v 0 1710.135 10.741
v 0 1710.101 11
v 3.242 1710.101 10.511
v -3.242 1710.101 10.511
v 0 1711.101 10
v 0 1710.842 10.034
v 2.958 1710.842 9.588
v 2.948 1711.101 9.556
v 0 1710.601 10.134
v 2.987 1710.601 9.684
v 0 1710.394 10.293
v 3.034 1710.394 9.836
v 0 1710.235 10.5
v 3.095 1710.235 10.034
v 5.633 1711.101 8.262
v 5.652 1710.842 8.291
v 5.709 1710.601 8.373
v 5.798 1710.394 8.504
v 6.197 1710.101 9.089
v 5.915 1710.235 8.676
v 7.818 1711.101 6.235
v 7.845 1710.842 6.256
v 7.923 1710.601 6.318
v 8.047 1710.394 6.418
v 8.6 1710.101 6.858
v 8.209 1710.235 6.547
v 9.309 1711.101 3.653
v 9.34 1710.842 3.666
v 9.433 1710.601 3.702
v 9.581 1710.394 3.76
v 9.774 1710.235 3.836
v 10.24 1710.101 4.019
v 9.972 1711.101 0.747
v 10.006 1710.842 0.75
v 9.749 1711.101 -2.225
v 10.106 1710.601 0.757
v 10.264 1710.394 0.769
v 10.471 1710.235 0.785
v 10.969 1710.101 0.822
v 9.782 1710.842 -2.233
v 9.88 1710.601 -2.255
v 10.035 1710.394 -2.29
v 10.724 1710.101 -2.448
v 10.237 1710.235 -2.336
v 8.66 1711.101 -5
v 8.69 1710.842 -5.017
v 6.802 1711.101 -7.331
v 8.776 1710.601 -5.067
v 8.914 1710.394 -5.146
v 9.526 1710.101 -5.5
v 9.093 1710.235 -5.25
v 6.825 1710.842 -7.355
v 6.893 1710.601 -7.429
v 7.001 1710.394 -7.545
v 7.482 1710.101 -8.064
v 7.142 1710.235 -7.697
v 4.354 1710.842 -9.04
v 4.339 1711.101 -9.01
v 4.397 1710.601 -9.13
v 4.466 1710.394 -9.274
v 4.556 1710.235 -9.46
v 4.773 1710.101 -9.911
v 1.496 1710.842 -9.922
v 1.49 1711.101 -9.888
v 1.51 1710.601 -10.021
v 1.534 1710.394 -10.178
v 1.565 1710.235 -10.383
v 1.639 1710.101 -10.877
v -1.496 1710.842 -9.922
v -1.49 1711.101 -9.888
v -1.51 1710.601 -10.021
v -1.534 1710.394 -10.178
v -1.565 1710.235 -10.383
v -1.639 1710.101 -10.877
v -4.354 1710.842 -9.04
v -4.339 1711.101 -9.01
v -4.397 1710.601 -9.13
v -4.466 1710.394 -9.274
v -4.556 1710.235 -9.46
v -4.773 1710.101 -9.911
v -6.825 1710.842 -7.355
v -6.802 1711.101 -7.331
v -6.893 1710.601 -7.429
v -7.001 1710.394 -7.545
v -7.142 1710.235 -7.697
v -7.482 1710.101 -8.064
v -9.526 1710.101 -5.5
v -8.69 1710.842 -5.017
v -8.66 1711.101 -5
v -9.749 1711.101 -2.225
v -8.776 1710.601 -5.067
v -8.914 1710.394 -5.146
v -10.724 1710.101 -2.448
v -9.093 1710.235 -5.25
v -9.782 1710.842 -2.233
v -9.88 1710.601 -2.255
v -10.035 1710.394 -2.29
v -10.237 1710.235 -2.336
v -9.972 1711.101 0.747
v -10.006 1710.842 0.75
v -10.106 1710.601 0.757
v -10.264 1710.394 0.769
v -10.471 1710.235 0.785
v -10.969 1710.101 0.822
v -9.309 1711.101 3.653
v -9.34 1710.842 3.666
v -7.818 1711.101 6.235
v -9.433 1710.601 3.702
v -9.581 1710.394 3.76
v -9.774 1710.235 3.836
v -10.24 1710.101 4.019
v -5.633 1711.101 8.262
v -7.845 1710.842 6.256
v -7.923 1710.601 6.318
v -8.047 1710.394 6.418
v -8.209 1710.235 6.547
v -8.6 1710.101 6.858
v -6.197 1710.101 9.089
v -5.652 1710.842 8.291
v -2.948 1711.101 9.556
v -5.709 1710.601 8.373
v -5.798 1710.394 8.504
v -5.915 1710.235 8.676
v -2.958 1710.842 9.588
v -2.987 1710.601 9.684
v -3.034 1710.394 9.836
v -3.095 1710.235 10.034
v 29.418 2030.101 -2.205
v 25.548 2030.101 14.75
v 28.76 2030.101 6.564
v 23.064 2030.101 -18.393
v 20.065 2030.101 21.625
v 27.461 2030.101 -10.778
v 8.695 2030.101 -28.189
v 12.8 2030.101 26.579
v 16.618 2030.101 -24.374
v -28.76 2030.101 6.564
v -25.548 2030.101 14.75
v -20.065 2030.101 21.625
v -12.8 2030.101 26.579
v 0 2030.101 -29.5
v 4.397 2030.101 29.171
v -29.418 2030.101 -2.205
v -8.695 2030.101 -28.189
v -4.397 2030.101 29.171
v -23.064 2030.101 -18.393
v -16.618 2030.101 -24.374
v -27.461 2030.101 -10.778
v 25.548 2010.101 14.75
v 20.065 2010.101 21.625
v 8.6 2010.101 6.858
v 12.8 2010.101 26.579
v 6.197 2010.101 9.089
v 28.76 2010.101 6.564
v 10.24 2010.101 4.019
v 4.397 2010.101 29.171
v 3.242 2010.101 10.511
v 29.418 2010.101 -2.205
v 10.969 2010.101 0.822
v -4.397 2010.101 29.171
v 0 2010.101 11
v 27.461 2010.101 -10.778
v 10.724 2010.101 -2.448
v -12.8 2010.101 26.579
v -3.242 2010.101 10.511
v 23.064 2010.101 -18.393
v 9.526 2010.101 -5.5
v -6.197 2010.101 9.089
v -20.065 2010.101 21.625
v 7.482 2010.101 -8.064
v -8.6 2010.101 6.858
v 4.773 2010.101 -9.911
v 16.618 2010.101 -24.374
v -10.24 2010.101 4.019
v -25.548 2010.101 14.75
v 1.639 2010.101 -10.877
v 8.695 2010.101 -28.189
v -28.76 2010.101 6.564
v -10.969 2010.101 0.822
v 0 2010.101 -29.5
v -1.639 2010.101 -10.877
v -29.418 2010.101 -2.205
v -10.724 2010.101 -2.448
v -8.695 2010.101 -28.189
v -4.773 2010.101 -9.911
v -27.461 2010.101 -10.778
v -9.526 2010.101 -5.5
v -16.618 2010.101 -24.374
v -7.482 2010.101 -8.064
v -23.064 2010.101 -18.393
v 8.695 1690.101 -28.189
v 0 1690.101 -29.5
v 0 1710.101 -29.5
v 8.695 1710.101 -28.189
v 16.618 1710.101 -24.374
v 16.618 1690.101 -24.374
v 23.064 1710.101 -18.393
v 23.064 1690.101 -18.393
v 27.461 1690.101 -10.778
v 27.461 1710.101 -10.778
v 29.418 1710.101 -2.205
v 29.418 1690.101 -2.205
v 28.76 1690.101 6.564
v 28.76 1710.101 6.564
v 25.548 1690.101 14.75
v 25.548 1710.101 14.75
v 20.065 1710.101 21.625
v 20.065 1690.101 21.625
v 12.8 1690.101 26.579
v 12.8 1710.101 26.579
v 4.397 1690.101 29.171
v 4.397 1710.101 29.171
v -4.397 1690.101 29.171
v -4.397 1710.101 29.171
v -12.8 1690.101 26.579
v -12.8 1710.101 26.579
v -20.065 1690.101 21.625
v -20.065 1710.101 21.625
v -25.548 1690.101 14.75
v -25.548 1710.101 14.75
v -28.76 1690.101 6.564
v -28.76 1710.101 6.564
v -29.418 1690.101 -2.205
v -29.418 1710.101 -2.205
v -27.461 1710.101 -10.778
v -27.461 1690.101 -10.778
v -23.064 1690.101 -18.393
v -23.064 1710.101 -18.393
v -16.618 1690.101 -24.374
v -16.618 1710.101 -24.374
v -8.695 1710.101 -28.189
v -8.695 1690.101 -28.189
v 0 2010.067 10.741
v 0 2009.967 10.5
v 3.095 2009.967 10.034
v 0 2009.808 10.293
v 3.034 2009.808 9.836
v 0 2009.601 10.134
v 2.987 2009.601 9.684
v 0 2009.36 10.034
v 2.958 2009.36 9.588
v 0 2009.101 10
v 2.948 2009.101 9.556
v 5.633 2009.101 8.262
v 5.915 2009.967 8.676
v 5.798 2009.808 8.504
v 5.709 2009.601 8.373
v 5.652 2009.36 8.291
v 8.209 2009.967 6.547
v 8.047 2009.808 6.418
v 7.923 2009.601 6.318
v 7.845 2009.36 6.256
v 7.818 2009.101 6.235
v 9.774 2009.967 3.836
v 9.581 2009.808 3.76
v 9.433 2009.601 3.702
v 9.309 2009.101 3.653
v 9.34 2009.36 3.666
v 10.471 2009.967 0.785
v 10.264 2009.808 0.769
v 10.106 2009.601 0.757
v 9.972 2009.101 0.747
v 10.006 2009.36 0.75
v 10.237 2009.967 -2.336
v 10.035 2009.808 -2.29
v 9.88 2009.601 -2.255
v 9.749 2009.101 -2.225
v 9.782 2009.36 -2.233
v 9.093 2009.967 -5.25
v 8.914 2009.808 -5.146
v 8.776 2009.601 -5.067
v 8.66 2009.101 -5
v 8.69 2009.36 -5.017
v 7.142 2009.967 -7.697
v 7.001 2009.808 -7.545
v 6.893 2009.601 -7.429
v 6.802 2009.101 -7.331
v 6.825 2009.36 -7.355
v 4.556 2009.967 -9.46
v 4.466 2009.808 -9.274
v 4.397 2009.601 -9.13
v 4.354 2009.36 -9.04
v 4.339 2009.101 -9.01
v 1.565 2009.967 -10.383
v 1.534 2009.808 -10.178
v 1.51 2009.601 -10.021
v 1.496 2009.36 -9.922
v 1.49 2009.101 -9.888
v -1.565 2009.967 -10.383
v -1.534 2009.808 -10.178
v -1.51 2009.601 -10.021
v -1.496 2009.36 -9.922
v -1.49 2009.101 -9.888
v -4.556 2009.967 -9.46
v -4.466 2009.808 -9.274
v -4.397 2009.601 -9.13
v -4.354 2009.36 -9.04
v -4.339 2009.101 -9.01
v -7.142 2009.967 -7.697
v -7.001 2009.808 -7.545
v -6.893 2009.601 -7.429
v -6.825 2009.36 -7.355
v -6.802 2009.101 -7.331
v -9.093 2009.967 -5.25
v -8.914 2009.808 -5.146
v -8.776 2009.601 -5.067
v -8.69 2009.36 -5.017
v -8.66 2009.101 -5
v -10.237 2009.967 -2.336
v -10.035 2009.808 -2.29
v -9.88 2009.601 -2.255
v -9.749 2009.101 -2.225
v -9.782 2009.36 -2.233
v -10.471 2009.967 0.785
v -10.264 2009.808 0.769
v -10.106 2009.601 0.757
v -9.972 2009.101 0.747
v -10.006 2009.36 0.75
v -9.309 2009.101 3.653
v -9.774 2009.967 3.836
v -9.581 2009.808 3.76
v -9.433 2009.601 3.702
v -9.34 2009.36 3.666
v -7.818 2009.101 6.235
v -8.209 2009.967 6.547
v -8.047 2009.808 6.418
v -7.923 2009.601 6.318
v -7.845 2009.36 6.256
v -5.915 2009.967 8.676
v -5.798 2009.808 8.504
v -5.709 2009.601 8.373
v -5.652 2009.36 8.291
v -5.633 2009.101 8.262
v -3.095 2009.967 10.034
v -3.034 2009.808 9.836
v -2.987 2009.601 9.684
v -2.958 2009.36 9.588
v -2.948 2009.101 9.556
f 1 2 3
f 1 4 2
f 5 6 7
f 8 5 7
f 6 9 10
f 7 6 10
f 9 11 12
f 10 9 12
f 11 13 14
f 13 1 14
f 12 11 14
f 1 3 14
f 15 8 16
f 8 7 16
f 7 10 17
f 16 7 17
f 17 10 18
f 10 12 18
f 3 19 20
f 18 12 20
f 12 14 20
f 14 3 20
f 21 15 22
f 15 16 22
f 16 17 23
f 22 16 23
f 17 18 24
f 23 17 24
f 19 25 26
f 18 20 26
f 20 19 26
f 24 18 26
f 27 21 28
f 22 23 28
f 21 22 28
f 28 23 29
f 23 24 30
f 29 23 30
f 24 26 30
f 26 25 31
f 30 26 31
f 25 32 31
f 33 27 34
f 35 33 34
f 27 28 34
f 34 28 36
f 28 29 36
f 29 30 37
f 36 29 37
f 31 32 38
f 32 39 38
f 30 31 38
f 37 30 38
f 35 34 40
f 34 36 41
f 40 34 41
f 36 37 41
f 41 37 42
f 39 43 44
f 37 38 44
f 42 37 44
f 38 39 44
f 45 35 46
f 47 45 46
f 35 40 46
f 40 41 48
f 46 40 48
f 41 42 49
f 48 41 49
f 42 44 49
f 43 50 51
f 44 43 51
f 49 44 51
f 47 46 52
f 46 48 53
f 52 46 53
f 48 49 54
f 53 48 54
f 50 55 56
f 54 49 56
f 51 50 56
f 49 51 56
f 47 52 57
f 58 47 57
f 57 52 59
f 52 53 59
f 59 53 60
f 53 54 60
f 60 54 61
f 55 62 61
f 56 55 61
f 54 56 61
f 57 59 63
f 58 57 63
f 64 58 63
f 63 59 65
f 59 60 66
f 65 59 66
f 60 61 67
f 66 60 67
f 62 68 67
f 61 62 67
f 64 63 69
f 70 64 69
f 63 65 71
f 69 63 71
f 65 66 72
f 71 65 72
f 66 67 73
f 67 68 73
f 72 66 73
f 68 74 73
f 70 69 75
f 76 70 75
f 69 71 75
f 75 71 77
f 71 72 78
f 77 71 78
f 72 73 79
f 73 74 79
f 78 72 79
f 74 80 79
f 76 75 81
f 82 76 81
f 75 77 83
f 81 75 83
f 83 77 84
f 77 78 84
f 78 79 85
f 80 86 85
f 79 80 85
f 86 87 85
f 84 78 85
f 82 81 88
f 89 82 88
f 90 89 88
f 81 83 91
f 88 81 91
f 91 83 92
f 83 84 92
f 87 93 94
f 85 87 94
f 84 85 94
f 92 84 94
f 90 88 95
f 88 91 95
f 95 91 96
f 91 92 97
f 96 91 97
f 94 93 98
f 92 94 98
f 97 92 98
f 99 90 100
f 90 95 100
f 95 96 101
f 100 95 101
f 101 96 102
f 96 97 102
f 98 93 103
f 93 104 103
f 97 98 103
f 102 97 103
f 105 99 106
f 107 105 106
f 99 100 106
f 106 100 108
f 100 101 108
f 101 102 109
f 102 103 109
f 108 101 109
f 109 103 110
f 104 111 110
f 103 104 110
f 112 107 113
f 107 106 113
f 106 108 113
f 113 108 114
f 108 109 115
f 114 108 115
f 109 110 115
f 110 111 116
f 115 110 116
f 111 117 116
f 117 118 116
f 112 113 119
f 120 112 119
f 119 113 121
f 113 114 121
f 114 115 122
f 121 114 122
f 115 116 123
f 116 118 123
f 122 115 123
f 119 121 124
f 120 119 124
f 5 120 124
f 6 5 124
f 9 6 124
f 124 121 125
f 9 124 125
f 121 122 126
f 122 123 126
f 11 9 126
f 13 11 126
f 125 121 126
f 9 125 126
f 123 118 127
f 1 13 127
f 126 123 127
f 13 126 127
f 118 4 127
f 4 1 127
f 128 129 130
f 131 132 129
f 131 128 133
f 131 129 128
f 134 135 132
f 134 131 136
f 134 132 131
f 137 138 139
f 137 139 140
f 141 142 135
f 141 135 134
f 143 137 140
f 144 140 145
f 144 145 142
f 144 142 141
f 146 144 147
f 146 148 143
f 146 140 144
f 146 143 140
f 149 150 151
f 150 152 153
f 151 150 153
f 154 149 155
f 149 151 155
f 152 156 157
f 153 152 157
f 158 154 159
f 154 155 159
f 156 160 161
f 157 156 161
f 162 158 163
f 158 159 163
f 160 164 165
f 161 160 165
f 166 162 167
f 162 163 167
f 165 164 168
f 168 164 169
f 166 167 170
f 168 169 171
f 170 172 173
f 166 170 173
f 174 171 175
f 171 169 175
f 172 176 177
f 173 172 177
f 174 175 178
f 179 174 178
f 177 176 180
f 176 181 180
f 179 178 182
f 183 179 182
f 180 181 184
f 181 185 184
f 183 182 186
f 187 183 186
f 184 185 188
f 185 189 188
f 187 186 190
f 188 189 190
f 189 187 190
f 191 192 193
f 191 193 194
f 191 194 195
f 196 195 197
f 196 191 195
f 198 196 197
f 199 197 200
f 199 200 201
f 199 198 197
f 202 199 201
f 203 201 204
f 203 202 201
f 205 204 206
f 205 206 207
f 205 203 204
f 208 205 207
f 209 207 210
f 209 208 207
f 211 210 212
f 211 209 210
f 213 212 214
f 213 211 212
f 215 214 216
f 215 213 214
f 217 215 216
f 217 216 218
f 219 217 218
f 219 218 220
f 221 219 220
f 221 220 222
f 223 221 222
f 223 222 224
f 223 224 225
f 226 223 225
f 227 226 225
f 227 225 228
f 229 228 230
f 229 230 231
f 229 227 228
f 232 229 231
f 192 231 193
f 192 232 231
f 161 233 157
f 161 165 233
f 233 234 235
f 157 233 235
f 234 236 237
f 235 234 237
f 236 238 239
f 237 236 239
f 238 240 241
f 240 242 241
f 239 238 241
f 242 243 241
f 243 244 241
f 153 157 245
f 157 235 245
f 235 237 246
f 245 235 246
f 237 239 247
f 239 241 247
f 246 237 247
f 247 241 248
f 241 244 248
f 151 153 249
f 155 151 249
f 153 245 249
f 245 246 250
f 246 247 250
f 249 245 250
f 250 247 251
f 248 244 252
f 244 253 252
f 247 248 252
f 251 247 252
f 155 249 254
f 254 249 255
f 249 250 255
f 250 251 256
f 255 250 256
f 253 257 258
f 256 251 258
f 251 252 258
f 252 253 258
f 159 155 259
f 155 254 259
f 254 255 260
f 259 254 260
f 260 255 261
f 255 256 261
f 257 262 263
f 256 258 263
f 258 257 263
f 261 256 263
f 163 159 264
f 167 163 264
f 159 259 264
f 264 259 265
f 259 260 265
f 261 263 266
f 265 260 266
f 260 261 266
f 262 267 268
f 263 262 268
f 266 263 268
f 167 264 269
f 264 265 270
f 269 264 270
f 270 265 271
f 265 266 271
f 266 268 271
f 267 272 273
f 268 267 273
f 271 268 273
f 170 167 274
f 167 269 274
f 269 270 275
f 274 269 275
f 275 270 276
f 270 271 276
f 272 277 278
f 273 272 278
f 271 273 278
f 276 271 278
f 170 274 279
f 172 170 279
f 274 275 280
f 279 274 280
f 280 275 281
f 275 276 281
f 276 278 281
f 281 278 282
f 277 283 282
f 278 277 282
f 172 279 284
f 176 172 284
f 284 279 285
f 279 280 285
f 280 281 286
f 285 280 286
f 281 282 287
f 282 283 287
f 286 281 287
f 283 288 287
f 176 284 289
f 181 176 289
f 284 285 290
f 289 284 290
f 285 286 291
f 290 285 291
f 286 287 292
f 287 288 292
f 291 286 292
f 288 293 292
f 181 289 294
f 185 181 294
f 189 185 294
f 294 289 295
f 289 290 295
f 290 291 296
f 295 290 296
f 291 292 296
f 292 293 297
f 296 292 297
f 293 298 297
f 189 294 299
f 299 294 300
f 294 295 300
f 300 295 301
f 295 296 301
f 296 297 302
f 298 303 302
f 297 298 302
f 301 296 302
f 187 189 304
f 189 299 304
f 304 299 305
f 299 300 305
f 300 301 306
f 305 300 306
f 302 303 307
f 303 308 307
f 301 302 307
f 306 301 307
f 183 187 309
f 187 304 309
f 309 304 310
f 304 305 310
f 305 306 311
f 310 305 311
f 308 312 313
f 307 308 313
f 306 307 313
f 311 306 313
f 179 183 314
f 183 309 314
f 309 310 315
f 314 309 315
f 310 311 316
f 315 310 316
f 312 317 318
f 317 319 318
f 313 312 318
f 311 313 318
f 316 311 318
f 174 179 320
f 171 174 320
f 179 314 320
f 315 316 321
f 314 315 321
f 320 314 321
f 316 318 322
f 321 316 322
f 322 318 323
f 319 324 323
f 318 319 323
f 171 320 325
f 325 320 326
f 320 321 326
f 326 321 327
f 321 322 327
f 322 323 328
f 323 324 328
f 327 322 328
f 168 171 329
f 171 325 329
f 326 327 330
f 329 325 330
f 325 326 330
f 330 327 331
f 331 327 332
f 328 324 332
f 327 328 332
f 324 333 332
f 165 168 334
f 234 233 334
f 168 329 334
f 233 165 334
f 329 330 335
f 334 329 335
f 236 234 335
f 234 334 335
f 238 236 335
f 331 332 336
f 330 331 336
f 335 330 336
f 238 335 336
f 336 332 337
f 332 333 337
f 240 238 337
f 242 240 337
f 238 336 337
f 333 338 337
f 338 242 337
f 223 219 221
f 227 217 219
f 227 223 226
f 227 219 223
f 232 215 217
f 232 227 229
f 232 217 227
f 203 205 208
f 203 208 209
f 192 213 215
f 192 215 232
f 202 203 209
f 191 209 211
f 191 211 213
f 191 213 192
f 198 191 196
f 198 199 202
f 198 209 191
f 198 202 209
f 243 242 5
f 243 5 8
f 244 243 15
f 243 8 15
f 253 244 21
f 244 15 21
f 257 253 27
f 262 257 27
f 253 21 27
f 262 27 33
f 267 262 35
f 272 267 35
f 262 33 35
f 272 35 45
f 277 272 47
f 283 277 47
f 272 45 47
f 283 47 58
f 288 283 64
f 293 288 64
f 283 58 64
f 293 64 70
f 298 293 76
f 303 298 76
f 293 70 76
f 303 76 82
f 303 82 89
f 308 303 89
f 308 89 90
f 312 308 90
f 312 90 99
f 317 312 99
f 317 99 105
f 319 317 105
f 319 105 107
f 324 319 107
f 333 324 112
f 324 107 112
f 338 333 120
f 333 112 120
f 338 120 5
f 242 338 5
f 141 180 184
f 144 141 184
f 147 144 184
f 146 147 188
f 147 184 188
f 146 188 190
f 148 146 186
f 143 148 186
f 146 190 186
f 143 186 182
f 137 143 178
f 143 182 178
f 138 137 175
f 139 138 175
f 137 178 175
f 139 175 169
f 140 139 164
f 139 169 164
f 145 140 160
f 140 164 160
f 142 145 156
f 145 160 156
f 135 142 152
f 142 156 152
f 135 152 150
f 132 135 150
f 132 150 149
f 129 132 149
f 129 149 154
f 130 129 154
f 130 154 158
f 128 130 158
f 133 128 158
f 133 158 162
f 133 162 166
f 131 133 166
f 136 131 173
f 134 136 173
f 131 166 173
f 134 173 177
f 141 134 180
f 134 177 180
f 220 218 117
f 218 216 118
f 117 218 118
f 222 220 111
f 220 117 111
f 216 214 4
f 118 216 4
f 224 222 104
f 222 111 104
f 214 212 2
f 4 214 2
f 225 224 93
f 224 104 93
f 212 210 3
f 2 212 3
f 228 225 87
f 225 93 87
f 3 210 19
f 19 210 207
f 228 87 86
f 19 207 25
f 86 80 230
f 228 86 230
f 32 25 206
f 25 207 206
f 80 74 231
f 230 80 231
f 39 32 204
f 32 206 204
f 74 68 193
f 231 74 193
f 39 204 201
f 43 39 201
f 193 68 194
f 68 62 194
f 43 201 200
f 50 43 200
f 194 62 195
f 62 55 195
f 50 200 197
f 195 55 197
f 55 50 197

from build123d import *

# Parameters (mm, degrees)
SKETCH_1_R      = 29.5
EXTRUDE_1_DEPTH = 20
SKETCH_3_R      = 10
EXTRUDE_2_DEPTH = 300
SKETCH_4_R      = 29.5
EXTRUDE_3_DEPTH = 20
FILLET_1_R      = 1


with BuildPart() as part:
    # 草图1 → 凸台-拉伸1 (new body)
    with BuildSketch(Plane.XZ.offset(-1690.101215638)):
        with Locations(Location((0, 0, 0), (0, 0, 270))):
            Circle(SKETCH_1_R)
    extrude(amount=-EXTRUDE_1_DEPTH)

    # 草图3 → 凸台-拉伸2 (add)
    with BuildSketch(Plane(origin=(0, 1710.101215638, 0), x_dir=(1, 0, 0), z_dir=(0, 1, 0))):
        with Locations(Location((0, 0, 0), (0, 0, 270))):
            Circle(SKETCH_3_R)
    extrude(amount=EXTRUDE_2_DEPTH)

    # 草图4 → 凸台-拉伸3 (add)
    with BuildSketch(Plane(origin=(0, 2010.101215638, 0), x_dir=(1, 0, 0), z_dir=(0, 1, 0))):
        with Locations(Location((0, 0, 0), (0, 0, 90))):
            Circle(SKETCH_4_R)
    extrude(amount=EXTRUDE_3_DEPTH)

    # 圆角1
    fillet_1_edges = [part.edges().sort_by_distance(p)[0] for p in [
        (0, 1710.101215638, -10),
        (0, 2010.101215638, -10),
    ]]
    fillet(fillet_1_edges, radius=FILLET_1_R)


solid = part.part
